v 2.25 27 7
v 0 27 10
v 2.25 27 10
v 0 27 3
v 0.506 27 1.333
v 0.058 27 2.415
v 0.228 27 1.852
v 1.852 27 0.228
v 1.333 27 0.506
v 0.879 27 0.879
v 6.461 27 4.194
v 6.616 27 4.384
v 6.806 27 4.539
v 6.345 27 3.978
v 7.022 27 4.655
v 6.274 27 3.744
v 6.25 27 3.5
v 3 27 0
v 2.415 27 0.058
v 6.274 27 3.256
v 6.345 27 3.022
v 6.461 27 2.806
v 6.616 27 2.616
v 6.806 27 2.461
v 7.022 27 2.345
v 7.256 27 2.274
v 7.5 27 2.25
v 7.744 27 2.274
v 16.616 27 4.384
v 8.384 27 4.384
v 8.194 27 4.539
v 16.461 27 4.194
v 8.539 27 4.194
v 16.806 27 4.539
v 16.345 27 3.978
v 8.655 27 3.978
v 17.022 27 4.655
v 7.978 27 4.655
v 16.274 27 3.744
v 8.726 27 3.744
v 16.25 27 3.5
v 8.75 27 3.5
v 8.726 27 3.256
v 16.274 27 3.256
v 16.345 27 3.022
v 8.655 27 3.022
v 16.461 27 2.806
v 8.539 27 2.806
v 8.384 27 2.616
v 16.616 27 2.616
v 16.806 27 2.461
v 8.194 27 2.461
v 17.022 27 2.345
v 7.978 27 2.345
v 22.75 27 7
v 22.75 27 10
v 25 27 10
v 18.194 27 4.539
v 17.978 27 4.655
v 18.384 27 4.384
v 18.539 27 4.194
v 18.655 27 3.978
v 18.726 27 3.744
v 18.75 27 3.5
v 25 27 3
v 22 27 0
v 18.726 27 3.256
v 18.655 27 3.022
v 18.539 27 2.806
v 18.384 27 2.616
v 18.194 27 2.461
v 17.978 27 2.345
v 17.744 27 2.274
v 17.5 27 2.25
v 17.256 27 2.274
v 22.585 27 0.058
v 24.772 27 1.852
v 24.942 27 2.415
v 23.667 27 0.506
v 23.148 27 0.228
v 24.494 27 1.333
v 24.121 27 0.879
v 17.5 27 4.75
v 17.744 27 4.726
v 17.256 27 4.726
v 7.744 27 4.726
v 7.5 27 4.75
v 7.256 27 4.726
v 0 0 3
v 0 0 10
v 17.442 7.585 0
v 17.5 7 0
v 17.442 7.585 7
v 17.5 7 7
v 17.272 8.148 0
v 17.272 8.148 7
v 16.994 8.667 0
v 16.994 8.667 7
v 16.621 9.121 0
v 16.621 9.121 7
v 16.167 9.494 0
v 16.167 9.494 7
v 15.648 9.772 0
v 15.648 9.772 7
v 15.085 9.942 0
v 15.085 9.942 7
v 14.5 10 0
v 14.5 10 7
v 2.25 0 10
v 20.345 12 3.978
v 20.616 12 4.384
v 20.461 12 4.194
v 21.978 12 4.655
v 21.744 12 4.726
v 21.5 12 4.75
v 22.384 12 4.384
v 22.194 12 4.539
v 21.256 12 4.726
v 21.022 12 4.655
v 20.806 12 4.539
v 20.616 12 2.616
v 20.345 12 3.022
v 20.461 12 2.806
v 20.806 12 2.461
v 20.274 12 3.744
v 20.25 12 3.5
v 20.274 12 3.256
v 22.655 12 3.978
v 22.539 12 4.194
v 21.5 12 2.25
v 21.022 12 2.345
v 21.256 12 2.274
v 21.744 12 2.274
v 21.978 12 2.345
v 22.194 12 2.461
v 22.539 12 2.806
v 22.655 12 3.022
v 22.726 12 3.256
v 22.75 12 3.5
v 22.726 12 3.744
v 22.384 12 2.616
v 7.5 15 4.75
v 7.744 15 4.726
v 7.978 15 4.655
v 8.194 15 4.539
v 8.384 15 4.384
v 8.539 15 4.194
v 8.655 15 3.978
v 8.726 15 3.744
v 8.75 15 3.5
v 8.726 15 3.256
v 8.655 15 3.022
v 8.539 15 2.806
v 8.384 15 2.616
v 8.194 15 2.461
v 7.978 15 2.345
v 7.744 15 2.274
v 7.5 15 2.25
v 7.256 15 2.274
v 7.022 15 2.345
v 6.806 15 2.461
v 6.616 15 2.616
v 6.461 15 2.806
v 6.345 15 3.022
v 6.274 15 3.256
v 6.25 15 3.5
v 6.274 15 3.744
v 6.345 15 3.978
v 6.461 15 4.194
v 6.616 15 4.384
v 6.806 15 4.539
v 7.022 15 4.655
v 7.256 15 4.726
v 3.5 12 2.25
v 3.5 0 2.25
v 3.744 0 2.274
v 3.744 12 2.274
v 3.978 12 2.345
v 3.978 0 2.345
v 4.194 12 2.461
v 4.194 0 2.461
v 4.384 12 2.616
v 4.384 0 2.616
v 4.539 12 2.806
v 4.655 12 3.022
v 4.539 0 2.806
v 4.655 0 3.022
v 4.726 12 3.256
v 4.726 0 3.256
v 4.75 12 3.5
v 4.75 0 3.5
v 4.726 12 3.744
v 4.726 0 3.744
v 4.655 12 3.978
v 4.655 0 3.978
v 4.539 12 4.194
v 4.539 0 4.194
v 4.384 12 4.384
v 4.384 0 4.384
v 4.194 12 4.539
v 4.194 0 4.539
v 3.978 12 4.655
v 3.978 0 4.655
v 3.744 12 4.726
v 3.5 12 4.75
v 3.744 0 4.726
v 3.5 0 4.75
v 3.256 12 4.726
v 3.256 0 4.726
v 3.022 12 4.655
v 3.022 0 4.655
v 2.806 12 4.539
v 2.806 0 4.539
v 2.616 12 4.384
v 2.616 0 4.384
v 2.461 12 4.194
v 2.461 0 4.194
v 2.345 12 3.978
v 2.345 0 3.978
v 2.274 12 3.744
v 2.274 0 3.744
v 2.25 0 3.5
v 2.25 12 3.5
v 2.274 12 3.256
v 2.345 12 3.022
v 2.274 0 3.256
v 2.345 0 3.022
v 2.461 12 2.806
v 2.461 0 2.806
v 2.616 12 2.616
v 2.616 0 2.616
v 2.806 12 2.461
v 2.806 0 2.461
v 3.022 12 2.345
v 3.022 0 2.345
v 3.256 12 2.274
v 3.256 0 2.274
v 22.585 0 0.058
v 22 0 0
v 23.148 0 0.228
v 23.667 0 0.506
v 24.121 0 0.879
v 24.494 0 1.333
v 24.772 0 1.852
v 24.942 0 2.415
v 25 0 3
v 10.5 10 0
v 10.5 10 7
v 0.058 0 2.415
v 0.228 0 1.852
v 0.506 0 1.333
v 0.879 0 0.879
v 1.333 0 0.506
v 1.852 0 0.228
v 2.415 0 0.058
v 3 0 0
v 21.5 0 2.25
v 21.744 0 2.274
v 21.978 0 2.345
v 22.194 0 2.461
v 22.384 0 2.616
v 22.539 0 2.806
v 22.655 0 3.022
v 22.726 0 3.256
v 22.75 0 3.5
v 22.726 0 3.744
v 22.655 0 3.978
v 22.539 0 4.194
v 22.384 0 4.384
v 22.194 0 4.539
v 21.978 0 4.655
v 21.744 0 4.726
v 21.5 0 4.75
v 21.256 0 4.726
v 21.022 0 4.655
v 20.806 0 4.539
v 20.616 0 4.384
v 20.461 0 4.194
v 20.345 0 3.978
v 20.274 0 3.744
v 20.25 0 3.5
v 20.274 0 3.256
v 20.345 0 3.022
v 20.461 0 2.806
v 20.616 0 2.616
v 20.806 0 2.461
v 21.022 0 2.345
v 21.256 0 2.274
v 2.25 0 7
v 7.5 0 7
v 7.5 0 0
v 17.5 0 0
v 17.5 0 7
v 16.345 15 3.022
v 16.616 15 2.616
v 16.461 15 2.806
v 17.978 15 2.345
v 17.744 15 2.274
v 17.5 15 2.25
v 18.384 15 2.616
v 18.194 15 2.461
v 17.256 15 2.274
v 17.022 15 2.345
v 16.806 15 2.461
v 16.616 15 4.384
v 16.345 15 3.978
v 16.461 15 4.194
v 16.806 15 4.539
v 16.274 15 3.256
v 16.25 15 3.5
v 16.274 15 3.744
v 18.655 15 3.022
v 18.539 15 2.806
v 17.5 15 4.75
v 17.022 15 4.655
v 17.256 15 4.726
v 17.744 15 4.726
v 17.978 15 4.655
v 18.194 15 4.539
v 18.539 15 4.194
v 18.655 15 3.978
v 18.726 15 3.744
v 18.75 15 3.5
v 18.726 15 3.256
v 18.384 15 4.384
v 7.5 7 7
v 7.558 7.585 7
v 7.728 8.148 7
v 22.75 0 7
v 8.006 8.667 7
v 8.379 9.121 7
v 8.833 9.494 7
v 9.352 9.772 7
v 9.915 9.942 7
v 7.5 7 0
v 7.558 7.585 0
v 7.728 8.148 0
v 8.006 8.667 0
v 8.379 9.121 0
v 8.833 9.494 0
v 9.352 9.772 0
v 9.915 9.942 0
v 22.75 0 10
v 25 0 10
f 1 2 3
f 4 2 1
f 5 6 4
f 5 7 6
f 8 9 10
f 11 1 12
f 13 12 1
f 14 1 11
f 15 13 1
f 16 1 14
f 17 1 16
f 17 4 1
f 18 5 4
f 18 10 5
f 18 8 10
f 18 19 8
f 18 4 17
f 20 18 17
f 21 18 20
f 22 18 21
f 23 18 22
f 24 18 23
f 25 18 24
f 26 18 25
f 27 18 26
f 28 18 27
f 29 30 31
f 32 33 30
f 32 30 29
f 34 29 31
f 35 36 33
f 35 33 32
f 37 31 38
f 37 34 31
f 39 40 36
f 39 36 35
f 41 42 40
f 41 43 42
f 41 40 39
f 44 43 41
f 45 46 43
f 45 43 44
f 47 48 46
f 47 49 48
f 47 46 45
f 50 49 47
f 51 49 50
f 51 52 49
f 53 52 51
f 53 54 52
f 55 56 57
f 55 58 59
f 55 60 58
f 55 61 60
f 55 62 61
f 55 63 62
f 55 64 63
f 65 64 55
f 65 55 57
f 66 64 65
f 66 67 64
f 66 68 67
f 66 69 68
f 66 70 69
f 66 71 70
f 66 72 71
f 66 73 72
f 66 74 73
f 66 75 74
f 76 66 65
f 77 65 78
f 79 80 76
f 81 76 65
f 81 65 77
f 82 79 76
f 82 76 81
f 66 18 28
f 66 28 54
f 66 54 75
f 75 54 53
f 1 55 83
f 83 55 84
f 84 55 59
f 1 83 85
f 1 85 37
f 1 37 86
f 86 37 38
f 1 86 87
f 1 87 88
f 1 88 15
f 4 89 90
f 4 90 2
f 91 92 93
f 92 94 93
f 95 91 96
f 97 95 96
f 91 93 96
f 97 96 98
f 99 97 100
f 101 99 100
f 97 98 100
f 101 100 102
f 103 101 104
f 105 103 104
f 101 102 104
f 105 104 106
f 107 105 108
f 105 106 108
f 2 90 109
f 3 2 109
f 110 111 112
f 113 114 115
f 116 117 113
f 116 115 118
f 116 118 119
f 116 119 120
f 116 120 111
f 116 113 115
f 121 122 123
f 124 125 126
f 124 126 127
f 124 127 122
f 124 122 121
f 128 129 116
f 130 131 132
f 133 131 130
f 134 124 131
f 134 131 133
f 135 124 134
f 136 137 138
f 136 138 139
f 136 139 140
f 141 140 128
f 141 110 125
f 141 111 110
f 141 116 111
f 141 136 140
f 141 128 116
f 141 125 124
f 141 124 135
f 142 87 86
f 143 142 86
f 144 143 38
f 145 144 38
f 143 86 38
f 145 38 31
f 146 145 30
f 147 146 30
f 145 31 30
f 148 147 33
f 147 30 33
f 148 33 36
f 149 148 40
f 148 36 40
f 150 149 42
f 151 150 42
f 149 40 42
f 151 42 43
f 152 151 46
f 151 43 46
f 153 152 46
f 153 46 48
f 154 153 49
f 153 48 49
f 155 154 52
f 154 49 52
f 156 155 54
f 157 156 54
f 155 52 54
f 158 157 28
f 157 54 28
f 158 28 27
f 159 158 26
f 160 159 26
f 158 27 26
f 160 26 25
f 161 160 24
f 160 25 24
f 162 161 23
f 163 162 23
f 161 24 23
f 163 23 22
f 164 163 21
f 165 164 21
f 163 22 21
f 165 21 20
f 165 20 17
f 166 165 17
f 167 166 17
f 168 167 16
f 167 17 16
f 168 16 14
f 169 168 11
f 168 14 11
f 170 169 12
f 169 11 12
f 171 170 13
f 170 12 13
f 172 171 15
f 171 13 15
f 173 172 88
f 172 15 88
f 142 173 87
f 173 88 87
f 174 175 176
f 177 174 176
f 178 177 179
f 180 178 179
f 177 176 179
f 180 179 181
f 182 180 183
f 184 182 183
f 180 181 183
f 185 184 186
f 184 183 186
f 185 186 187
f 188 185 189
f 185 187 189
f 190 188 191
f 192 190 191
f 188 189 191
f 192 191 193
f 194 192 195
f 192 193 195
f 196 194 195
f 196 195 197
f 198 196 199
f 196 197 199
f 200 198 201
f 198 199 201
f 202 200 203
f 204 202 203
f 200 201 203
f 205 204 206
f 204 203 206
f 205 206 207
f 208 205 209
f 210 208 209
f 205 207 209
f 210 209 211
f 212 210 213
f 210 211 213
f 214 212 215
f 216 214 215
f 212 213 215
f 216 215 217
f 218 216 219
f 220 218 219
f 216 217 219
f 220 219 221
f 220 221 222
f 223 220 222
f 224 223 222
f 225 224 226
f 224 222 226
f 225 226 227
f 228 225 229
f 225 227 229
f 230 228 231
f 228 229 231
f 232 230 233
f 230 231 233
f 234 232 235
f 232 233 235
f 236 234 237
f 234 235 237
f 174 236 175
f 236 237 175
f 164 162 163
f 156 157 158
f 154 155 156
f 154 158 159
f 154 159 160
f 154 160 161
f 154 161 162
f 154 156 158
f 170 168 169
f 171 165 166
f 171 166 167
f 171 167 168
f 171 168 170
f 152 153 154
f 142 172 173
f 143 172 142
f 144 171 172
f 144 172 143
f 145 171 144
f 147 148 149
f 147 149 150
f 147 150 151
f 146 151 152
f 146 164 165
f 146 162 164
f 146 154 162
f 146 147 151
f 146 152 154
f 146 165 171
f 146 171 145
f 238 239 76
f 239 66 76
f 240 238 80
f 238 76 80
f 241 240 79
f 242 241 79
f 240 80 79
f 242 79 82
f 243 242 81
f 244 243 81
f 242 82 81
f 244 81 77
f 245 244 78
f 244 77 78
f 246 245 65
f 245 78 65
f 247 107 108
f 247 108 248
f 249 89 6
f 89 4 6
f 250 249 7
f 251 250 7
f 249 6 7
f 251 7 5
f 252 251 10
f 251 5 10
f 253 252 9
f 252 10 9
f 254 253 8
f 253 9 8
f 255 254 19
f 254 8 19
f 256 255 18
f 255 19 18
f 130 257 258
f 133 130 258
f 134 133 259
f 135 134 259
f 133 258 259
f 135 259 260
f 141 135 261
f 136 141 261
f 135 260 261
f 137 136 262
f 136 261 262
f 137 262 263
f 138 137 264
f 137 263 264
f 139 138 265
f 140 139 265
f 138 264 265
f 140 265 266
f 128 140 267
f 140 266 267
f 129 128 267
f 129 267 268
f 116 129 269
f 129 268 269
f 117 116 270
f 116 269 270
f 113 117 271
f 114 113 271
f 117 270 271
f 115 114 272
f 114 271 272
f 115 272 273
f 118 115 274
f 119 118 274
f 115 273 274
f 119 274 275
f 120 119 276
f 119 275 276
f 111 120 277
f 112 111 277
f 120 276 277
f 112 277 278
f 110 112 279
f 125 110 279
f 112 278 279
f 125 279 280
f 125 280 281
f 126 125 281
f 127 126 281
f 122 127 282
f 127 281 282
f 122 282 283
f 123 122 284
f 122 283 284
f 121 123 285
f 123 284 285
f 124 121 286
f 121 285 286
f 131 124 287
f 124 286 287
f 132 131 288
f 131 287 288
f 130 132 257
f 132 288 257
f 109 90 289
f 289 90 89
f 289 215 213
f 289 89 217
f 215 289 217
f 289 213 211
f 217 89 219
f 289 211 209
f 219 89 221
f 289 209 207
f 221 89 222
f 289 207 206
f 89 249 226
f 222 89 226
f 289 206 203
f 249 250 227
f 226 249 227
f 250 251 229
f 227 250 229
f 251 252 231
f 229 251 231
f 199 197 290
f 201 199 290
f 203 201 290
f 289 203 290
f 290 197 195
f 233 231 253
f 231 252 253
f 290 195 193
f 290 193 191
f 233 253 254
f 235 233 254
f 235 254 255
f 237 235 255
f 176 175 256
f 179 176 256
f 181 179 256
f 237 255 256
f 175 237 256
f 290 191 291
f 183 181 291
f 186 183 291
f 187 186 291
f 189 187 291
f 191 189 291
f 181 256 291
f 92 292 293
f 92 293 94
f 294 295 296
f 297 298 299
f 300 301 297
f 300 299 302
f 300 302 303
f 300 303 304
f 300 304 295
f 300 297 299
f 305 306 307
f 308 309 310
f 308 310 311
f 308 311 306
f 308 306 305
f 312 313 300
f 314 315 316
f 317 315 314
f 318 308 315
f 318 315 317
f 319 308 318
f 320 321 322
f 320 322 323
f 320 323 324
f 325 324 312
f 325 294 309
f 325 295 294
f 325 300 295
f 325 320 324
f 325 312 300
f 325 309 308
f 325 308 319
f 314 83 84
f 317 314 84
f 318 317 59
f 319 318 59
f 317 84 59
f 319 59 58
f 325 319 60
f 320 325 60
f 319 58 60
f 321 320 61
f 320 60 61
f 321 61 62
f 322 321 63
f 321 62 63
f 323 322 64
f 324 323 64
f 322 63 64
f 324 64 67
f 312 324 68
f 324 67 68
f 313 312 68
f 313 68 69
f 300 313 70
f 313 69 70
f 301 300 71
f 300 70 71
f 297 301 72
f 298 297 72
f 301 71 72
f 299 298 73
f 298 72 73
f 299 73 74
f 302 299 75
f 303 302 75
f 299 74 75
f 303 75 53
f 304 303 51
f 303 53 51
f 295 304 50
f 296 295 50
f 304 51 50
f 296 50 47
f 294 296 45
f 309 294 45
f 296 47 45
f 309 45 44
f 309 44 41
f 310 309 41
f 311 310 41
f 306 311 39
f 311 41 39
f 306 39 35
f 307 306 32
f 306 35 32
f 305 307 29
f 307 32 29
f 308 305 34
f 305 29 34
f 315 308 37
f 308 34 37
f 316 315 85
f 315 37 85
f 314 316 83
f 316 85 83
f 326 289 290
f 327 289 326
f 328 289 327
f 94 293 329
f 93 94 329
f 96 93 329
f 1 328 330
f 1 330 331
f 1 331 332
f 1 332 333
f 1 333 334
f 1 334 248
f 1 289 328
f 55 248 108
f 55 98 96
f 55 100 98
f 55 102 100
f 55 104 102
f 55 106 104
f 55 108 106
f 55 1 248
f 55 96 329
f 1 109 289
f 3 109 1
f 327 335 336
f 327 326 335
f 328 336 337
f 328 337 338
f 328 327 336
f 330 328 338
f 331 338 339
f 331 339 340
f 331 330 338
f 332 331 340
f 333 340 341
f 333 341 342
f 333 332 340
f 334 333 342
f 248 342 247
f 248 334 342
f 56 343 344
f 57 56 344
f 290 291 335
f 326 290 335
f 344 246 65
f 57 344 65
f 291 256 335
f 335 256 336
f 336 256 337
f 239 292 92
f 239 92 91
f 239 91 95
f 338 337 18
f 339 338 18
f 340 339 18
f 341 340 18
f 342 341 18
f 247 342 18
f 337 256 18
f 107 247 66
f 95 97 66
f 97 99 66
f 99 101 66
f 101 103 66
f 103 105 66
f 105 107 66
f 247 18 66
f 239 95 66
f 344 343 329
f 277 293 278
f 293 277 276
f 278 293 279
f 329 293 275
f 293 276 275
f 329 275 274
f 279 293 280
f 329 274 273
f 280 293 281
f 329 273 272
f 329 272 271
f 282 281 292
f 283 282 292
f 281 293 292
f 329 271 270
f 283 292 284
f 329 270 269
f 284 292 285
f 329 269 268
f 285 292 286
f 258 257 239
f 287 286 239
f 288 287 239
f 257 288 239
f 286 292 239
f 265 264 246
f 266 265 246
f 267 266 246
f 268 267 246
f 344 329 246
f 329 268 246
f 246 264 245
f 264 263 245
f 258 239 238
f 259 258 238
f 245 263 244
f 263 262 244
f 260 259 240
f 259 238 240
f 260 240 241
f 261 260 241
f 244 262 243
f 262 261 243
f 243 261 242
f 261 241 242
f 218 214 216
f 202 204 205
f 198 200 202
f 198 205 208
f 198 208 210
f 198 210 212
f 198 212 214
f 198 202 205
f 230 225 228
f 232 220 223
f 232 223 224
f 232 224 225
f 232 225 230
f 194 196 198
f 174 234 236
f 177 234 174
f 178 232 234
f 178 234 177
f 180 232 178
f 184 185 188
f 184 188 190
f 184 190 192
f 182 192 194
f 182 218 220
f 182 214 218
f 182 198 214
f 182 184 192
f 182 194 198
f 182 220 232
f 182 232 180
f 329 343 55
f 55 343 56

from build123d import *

# Parameters (mm, degrees)
SKETCH_1_W          = 25
SKETCH_1_H          = 27
EXTRUDE_1_DEPTH     = 10
SKETCH_2_W          = 20.5
SKETCH_2_H          = 27
CUT_EXTRUDE_1_DEPTH = 3
SKETCH_3_R          = 1.25
CUT_EXTRUDE_2_DEPTH = 12
SKETCH_4_R          = 1.25
CUT_EXTRUDE_3_DEPTH = 12
SKETCH_5_W          = 10
SKETCH_5_H          = 10
CUT_EXTRUDE_4_DEPTH = 12
FILLET_1_R          = 3


with BuildPart() as part:
    # 스케치1 → 보스-돌출1 (new body)
    with BuildSketch(Plane.XY):
        with Locations((12.5, 13.5)):
            Rectangle(SKETCH_1_W, SKETCH_1_H)
    extrude(amount=EXTRUDE_1_DEPTH)

    # 스케치2 → 컷-돌출1 (cut)
    with BuildSketch(Plane.XY.offset(10)):
        with Locations((12.5, 13.5)):
            Rectangle(SKETCH_2_W, SKETCH_2_H)
    extrude(amount=-CUT_EXTRUDE_1_DEPTH, mode=Mode.SUBTRACT)

    # 스케치3 → 컷-돌출2 (cut)
    with BuildSketch(Plane(origin=(0, 27, 0), x_dir=(1, 0, 0), z_dir=(0, 1, 0))):
        with Locations(Location((7.5, -3.5, 0), (0, 0, 270))):
            Circle(SKETCH_3_R)
        with Locations(Location((17.5, -3.5, 0), (0, 0, 270))):
            Circle(SKETCH_3_R)
    extrude(amount=-CUT_EXTRUDE_2_DEPTH, mode=Mode.SUBTRACT)

    # 스케치4 → 컷-돌출3 (cut)
    with BuildSketch(Plane.XZ):
        with Locations(Location((3.5, 3.5, 0), (0, 0, 270))):
            Circle(SKETCH_4_R)
        with Locations(Location((21.5, 3.5, 0), (0, 0, 270))):
            Circle(SKETCH_4_R)
    extrude(amount=-CUT_EXTRUDE_3_DEPTH, mode=Mode.SUBTRACT)

    # 스케치5 → 컷-돌출4 (cut)
    with BuildSketch(Plane(origin=(0, 0, 0), x_dir=(-1, 0, 0), z_dir=(0, 0, -1))):
        with Locations((-12.5, 5)):
            Rectangle(SKETCH_5_W, SKETCH_5_H)
    extrude(amount=-CUT_EXTRUDE_4_DEPTH, mode=Mode.SUBTRACT)

    # 필렛1
    fillet_1_edges = [part.edges().sort_by_distance(p)[0] for p in [
        (25, 13.5, 0),
        (17.5, 10, 3.5),
        (7.5, 10, 3.5),
        (0, 13.5, 0),
    ]]
    fillet(fillet_1_edges, radius=FILLET_1_R)


solid = part.part
